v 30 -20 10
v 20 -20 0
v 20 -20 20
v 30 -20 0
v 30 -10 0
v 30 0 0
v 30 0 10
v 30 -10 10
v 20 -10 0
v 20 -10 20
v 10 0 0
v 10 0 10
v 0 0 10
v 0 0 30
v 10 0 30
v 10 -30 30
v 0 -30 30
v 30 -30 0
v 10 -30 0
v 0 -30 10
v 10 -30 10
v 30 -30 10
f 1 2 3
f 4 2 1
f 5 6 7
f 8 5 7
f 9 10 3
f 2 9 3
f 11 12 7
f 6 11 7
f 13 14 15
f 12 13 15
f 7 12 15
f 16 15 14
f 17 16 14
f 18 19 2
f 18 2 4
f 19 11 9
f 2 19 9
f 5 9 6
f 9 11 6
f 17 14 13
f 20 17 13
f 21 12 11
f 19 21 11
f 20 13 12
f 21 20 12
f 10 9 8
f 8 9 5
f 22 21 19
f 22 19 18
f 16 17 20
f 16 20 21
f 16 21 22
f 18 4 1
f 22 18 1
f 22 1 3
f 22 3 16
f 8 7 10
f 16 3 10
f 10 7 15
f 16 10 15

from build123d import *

# Parameters (mm, degrees)
F1_DEPTH = 30
F2_W     = 10
F2_H     = 10
F3_DEPTH = 30.001


with BuildPart() as f1:
    # F0 (on Front) → F1 (new body)
    with BuildSketch(Plane.XZ):
        Polygon((10, 10), (10, 0), (30, 0), (30, 10), (10, 30), (0, 30), (0, 10), align=None)
    extrude(amount=F1_DEPTH)

    # F2 (on face) → F3 (cut, through all)
    with BuildSketch(Plane(origin=(0, 0, 0), x_dir=(1, 0, 0), z_dir=(0, 0, -1))):
        with Locations((25, 15)):
            Rectangle(F2_W, F2_H)
    extrude(amount=-F3_DEPTH, mode=Mode.SUBTRACT)


solid = f1.part
